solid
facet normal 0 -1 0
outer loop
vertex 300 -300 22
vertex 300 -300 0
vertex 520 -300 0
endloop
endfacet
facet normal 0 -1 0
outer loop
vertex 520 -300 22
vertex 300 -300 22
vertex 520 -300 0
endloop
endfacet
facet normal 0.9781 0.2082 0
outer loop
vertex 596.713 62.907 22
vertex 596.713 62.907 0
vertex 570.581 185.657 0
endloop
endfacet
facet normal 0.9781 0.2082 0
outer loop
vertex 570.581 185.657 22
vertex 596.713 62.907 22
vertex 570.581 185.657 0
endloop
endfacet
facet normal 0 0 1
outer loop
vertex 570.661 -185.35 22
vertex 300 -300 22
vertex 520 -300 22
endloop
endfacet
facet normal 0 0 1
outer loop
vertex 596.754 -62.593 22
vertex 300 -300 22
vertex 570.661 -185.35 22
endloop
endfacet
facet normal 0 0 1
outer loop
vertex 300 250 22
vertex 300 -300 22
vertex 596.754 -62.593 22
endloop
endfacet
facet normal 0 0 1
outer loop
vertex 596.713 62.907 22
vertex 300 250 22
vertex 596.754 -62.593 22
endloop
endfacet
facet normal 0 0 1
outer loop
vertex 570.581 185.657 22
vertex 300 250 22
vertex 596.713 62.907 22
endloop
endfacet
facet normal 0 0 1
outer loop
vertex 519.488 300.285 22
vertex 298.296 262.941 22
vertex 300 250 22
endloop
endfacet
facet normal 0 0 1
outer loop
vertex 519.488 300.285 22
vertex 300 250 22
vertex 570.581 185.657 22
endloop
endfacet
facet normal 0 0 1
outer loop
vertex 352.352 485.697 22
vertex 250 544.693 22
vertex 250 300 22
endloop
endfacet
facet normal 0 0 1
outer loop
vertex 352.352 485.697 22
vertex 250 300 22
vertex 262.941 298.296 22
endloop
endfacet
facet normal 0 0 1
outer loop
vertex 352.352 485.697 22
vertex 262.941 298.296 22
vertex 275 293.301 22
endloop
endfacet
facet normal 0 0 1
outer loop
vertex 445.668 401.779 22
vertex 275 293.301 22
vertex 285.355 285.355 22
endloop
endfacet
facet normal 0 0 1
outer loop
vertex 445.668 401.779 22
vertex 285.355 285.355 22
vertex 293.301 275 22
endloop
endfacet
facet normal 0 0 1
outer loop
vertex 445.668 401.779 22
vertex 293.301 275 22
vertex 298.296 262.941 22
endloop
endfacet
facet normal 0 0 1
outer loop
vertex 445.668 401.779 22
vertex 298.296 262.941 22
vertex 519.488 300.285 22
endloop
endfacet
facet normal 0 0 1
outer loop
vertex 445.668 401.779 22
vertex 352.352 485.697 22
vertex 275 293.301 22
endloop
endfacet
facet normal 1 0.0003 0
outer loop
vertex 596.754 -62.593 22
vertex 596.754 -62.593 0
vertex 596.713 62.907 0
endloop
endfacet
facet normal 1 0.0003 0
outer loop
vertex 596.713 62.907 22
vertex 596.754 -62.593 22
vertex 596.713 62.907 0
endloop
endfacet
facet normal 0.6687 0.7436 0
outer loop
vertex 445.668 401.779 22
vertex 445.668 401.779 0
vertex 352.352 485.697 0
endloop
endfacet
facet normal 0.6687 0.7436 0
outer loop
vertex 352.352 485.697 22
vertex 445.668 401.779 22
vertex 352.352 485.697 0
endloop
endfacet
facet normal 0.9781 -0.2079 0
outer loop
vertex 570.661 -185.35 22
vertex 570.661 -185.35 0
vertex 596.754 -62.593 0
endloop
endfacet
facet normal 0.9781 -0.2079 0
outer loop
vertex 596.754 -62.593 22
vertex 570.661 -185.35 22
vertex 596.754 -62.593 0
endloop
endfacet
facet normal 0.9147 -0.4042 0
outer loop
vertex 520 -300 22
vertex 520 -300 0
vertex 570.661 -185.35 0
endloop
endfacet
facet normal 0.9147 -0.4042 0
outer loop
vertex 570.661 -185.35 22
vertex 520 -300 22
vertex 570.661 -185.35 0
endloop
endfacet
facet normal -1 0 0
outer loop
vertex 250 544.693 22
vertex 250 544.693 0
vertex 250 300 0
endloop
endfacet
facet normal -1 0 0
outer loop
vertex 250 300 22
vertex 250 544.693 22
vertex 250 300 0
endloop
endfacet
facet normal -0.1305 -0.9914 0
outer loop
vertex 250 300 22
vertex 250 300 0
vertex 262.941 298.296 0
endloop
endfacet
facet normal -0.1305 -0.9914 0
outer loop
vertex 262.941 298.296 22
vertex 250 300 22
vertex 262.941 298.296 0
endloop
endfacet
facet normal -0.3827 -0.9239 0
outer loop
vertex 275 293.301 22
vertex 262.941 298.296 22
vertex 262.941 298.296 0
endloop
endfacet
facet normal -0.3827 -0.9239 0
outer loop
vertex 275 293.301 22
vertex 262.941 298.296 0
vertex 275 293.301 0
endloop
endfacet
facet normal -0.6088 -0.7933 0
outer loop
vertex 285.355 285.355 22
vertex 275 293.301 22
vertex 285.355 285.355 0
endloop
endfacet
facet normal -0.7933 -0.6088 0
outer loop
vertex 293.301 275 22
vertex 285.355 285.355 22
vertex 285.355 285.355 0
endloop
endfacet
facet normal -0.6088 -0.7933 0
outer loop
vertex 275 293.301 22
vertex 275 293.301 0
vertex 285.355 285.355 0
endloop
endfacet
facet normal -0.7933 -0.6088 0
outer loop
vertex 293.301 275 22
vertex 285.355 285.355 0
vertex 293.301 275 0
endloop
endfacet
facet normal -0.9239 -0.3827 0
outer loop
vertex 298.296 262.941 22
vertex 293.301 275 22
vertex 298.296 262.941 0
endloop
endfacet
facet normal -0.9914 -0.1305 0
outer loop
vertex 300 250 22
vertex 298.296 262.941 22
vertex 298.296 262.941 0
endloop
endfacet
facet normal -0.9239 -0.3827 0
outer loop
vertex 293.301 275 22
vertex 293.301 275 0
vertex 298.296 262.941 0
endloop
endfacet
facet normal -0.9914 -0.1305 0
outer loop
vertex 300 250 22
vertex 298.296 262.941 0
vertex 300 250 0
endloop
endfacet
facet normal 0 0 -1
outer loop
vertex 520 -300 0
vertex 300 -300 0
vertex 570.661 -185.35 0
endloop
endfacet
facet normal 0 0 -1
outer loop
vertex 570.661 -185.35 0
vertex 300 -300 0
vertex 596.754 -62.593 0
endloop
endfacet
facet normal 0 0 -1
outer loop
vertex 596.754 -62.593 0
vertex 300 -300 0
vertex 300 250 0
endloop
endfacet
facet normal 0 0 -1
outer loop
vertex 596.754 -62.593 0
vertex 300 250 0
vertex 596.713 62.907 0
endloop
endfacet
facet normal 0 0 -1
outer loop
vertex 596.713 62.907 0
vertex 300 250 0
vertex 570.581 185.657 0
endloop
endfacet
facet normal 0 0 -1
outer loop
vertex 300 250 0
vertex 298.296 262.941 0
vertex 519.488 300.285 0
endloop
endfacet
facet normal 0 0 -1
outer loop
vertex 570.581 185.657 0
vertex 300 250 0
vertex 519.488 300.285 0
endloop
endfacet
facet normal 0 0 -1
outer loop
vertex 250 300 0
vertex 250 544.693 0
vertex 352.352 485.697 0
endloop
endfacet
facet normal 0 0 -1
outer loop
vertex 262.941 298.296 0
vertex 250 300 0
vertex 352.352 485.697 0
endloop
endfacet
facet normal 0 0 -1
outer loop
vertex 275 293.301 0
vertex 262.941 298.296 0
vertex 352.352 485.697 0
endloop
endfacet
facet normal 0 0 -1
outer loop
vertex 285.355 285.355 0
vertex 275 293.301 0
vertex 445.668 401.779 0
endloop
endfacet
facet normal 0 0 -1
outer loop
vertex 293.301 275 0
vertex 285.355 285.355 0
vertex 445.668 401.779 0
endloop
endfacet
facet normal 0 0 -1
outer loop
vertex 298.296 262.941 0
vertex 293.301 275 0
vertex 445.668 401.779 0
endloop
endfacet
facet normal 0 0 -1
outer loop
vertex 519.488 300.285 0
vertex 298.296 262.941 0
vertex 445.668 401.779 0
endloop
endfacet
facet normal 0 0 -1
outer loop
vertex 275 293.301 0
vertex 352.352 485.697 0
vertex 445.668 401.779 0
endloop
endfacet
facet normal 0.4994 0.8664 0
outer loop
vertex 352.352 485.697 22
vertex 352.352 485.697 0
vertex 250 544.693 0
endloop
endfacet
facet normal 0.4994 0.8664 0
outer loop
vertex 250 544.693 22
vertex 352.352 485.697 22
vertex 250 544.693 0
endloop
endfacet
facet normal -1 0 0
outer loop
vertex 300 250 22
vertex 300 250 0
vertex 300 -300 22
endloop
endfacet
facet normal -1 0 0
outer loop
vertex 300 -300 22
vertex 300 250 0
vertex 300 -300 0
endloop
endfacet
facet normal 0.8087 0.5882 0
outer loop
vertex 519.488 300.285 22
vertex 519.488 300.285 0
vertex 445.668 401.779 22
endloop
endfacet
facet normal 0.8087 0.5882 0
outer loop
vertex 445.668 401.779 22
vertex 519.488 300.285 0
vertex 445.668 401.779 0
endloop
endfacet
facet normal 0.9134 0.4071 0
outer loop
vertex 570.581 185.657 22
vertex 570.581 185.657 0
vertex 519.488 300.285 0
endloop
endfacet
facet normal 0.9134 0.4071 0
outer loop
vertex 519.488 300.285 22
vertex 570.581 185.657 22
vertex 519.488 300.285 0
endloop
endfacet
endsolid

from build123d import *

# Parameters (mm, degrees)
F1_DEPTH = 22


with BuildPart() as f1:
    # F0 (on Top) → F1 (new body)
    with BuildSketch(Plane.XY):
        with BuildLine():
            Line((300, 250), (300, -300))
            Line((300, -300), (520, -300))
            Line((520, -300), (570.660691, -185.350045))
            Line((570.660691, -185.350045), (596.753608, -62.592521))
            Line((596.753608, -62.592521), (596.713076, 62.907472))
            Line((596.713076, 62.907472), (570.581421, 185.656756))
            Line((570.581421, 185.656756), (519.488048, 300.285362))
            Line((519.488048, 300.285362), (445.668405, 401.778762))
            Line((445.668405, 401.778762), (352.35202, 485.697188))
            Line((352.35202, 485.697188), (250, 544.693065))
            Line((250, 544.693065), (250, 300))
            ThreePointArc((250, 300), (285.355339, 285.355339), (300, 250))
        make_face()
    extrude(amount=F1_DEPTH)


solid = f1.part
